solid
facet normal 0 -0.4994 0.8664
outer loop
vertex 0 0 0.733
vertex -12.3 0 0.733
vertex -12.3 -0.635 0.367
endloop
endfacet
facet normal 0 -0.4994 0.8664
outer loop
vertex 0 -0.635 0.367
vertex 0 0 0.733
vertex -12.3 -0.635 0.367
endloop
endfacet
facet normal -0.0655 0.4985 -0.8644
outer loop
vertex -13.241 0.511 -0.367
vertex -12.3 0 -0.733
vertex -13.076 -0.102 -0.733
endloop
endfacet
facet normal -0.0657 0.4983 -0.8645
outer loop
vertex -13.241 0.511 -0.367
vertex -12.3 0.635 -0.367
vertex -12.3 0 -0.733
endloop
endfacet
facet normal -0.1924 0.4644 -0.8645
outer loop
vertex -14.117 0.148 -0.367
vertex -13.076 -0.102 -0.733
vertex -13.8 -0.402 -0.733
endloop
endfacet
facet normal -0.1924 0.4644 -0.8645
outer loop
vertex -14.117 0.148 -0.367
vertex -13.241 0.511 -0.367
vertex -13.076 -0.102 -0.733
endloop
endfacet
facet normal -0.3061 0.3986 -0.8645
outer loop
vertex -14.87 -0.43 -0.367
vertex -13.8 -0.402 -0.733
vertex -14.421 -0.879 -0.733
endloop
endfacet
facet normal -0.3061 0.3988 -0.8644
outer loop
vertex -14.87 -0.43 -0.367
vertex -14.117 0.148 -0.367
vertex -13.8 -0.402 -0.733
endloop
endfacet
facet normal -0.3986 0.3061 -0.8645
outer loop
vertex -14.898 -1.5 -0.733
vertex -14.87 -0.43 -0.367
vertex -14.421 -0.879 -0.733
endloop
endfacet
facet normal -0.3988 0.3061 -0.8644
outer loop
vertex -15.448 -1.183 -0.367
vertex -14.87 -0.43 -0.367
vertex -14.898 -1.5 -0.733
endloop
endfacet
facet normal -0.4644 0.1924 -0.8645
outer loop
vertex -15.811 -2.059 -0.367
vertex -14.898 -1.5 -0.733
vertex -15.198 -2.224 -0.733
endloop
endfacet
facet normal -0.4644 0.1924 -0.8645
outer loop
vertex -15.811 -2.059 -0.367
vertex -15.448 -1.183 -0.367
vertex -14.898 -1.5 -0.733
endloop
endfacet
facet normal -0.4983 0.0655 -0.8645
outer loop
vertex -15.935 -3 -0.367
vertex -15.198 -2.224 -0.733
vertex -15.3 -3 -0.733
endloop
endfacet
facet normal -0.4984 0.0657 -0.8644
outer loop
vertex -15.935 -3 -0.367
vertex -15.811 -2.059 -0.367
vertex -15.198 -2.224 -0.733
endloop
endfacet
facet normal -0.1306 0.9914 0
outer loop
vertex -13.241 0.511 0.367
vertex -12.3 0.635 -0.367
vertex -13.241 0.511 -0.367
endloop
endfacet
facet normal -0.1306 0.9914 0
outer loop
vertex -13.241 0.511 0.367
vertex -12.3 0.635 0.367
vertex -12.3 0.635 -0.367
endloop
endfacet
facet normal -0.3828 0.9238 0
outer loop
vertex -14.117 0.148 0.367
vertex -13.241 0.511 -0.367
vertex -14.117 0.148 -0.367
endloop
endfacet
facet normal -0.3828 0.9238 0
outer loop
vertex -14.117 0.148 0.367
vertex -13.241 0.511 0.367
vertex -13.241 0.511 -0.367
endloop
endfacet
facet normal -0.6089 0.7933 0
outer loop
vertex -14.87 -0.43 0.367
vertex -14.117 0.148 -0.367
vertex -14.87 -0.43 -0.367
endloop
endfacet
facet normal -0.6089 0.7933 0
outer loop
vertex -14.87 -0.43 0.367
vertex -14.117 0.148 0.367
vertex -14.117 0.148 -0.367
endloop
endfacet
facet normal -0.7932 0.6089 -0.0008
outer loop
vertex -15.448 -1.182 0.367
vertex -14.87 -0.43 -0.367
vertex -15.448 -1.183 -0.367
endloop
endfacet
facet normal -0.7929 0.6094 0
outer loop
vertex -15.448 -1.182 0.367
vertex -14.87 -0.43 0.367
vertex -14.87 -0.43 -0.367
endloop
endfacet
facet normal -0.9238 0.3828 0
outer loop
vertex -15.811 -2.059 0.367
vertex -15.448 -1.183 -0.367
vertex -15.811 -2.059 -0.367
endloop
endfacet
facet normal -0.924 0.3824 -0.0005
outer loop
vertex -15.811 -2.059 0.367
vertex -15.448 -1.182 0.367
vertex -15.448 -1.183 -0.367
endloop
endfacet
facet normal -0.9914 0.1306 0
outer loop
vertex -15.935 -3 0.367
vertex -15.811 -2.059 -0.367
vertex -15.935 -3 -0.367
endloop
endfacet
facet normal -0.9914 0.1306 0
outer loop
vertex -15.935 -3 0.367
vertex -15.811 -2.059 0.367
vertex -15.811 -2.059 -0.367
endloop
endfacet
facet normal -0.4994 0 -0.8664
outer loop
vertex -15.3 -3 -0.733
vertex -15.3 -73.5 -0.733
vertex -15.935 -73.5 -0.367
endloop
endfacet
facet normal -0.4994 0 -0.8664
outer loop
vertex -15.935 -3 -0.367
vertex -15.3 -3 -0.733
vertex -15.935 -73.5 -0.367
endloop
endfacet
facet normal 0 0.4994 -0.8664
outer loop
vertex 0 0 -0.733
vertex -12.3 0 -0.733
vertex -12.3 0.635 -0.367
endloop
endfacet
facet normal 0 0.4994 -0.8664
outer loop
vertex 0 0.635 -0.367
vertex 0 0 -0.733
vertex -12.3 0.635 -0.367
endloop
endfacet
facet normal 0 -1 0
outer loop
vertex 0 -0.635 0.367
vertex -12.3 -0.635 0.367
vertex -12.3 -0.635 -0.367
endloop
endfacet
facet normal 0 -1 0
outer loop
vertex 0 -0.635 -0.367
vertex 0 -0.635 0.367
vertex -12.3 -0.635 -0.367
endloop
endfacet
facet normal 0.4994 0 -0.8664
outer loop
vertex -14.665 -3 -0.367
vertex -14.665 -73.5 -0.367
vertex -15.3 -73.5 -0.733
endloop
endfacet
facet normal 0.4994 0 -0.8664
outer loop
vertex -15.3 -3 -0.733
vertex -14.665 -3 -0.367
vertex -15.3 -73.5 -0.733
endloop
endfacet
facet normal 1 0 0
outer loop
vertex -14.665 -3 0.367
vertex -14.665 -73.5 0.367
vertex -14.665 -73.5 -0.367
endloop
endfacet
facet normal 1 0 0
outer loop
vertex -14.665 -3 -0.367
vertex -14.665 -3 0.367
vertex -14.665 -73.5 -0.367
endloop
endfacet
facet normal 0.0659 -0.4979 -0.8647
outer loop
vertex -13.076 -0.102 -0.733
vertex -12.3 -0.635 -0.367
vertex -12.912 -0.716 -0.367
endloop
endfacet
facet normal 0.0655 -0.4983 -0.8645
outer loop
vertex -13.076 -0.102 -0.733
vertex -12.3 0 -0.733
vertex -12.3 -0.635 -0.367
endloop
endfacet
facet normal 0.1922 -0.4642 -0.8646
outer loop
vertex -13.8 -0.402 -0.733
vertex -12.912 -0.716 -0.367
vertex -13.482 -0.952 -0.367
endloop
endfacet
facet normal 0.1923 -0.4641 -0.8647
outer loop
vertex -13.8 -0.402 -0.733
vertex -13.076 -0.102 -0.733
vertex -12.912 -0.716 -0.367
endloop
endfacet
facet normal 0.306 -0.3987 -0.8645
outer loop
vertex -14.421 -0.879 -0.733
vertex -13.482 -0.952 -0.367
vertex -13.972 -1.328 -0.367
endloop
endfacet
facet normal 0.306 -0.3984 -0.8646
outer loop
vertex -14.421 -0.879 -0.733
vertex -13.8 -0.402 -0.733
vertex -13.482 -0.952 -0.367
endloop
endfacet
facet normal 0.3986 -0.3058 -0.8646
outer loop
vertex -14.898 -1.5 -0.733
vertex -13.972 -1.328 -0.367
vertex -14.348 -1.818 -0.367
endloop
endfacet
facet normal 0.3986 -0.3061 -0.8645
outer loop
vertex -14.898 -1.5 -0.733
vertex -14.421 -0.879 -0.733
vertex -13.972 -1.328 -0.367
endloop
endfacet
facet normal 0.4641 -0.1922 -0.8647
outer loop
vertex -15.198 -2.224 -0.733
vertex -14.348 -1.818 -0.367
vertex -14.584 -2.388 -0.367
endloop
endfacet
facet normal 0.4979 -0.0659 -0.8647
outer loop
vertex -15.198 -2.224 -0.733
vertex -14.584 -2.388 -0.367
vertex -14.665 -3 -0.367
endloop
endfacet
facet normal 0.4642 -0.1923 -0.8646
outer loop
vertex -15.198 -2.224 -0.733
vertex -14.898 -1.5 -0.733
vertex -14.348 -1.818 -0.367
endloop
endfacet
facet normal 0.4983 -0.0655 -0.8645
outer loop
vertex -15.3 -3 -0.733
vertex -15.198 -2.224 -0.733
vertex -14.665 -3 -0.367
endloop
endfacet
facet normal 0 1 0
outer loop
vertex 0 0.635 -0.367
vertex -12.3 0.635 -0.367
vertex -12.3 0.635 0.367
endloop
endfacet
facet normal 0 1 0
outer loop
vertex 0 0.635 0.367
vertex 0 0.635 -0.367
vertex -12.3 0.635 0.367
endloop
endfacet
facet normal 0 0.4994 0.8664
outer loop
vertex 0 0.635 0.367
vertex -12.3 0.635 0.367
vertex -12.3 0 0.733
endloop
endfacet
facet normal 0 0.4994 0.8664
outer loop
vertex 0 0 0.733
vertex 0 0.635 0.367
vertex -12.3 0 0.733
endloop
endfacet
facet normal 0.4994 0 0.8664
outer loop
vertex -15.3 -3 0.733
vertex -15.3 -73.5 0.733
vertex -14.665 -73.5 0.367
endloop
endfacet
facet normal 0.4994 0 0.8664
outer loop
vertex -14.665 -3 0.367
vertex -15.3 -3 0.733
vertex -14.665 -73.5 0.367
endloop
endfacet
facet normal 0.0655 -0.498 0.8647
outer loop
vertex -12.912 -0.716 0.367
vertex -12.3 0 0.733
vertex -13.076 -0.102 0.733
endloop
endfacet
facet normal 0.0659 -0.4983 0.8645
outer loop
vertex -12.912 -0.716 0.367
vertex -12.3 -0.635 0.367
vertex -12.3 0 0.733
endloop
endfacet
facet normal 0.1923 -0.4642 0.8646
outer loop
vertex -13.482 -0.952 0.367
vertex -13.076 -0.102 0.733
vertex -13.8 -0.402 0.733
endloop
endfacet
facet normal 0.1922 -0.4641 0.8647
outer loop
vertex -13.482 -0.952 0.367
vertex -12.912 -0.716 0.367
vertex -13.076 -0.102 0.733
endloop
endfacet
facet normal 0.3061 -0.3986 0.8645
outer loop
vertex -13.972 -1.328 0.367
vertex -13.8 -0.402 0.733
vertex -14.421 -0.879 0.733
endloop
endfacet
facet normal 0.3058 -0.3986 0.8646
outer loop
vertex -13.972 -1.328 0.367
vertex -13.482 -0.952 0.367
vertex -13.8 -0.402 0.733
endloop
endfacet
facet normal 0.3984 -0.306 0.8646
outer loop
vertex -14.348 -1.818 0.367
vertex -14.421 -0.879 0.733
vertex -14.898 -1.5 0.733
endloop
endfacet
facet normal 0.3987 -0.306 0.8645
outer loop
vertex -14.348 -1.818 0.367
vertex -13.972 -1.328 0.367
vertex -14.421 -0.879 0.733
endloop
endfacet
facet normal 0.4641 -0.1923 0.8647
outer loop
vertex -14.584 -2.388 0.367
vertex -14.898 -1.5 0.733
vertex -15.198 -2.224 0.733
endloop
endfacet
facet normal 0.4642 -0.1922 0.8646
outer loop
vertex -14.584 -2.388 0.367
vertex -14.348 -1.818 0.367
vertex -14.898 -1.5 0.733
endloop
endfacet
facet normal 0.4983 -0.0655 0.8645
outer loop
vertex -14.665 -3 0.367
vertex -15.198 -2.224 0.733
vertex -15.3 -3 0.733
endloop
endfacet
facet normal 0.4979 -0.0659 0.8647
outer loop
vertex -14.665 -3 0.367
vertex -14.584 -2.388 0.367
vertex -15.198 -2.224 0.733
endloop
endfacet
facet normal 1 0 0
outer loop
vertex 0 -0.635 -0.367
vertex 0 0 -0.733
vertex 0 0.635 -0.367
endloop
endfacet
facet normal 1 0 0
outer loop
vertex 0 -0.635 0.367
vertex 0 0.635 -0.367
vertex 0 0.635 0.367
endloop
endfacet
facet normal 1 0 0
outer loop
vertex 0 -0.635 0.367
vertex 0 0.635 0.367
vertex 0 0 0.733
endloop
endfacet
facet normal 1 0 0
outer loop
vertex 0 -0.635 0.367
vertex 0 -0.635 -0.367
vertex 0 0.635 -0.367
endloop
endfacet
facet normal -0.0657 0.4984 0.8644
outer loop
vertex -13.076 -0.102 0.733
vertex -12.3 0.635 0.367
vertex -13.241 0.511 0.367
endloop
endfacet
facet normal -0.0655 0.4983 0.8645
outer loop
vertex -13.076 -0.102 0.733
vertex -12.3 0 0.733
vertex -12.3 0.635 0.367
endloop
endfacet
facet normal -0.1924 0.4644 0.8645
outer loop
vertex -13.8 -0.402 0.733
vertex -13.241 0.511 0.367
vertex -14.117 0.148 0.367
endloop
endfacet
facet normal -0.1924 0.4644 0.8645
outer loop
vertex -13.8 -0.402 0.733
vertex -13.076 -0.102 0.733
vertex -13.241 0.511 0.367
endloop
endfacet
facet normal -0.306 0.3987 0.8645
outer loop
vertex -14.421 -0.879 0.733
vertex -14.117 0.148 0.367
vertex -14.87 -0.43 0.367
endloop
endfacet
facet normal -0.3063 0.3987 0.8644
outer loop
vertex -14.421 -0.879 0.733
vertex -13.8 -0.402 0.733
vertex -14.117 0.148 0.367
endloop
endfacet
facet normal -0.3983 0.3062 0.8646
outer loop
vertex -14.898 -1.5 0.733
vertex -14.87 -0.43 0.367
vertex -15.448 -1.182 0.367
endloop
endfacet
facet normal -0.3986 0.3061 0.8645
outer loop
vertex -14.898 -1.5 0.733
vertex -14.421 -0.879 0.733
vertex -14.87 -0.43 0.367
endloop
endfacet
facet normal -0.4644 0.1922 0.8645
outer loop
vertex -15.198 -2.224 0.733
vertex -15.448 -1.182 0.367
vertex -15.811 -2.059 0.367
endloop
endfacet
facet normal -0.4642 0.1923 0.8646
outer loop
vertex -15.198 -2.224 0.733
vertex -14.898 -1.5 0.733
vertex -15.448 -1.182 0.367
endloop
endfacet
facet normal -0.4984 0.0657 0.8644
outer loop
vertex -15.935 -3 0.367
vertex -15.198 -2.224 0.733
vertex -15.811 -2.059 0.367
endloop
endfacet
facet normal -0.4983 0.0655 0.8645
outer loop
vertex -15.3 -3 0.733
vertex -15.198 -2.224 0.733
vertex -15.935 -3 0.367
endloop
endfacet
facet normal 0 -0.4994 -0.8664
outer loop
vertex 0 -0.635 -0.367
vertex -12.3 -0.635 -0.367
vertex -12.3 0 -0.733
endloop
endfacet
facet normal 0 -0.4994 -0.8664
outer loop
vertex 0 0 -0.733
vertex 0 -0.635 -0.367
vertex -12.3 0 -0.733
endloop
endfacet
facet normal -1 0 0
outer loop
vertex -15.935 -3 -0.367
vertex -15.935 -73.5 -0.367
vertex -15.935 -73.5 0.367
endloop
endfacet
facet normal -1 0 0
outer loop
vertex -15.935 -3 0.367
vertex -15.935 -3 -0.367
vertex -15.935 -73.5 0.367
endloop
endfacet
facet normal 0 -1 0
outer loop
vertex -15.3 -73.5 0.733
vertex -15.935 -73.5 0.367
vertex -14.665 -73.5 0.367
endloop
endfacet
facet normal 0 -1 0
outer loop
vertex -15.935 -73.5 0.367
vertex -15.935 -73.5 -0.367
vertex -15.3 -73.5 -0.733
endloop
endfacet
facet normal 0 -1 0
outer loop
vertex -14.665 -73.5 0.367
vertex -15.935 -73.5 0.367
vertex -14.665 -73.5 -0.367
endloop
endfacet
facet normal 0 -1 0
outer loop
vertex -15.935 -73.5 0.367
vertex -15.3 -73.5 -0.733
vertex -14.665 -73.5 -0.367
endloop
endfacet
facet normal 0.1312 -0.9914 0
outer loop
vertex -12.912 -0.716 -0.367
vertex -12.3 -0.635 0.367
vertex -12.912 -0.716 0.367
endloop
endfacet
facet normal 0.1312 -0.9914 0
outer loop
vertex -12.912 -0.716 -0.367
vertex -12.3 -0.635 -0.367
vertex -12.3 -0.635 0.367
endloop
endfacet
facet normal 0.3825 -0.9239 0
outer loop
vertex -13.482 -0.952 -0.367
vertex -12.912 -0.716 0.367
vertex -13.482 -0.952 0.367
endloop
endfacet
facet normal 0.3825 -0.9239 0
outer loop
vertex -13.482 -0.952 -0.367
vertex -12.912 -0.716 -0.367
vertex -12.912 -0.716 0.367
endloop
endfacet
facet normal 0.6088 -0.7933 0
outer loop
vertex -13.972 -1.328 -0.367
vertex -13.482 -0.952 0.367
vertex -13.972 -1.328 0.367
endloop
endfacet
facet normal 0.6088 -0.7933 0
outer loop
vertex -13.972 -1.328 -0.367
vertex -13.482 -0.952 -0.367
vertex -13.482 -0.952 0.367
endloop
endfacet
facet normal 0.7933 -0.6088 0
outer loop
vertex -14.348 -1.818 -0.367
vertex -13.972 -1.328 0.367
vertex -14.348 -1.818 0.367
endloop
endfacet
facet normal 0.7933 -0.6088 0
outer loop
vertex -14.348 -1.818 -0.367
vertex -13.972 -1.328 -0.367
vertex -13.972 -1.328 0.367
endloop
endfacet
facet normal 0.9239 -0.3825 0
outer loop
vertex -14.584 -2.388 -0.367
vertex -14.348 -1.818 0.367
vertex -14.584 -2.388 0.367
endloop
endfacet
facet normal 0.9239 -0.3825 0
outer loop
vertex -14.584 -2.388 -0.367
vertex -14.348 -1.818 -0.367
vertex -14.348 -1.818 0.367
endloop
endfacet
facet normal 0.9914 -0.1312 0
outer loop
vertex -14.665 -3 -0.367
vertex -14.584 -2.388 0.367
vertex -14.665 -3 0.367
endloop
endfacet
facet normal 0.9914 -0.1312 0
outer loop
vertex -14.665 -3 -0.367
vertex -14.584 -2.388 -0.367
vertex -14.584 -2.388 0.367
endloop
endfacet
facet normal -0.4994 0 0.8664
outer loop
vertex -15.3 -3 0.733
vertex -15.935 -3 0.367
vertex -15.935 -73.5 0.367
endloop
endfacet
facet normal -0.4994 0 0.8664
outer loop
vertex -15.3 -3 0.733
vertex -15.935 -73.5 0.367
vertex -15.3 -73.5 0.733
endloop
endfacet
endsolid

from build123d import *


with BuildPart() as part:
    # AdditivePipe: sweep along a path in Sketch001
    with BuildLine(Plane.XY) as additivepipe_path:
        Line((0, 0), (-12.3, 0))
        ThreePointArc((-12.3, 0), (-14.42132, -0.87868), (-15.3, -3))
        Line((-15.3, -3), (-15.3, -73.5))
    # Sketch → AdditivePipe (sweep)
    with BuildSketch(Plane.YZ):
        Polygon((0, 0.733235), (-0.635, 0.366617), (-0.635, -0.366617), (0, -0.733235), (0.635, -0.366617), (0.635, 0.366617), align=None)
    sweep(path=additivepipe_path.line)


solid = part.part
